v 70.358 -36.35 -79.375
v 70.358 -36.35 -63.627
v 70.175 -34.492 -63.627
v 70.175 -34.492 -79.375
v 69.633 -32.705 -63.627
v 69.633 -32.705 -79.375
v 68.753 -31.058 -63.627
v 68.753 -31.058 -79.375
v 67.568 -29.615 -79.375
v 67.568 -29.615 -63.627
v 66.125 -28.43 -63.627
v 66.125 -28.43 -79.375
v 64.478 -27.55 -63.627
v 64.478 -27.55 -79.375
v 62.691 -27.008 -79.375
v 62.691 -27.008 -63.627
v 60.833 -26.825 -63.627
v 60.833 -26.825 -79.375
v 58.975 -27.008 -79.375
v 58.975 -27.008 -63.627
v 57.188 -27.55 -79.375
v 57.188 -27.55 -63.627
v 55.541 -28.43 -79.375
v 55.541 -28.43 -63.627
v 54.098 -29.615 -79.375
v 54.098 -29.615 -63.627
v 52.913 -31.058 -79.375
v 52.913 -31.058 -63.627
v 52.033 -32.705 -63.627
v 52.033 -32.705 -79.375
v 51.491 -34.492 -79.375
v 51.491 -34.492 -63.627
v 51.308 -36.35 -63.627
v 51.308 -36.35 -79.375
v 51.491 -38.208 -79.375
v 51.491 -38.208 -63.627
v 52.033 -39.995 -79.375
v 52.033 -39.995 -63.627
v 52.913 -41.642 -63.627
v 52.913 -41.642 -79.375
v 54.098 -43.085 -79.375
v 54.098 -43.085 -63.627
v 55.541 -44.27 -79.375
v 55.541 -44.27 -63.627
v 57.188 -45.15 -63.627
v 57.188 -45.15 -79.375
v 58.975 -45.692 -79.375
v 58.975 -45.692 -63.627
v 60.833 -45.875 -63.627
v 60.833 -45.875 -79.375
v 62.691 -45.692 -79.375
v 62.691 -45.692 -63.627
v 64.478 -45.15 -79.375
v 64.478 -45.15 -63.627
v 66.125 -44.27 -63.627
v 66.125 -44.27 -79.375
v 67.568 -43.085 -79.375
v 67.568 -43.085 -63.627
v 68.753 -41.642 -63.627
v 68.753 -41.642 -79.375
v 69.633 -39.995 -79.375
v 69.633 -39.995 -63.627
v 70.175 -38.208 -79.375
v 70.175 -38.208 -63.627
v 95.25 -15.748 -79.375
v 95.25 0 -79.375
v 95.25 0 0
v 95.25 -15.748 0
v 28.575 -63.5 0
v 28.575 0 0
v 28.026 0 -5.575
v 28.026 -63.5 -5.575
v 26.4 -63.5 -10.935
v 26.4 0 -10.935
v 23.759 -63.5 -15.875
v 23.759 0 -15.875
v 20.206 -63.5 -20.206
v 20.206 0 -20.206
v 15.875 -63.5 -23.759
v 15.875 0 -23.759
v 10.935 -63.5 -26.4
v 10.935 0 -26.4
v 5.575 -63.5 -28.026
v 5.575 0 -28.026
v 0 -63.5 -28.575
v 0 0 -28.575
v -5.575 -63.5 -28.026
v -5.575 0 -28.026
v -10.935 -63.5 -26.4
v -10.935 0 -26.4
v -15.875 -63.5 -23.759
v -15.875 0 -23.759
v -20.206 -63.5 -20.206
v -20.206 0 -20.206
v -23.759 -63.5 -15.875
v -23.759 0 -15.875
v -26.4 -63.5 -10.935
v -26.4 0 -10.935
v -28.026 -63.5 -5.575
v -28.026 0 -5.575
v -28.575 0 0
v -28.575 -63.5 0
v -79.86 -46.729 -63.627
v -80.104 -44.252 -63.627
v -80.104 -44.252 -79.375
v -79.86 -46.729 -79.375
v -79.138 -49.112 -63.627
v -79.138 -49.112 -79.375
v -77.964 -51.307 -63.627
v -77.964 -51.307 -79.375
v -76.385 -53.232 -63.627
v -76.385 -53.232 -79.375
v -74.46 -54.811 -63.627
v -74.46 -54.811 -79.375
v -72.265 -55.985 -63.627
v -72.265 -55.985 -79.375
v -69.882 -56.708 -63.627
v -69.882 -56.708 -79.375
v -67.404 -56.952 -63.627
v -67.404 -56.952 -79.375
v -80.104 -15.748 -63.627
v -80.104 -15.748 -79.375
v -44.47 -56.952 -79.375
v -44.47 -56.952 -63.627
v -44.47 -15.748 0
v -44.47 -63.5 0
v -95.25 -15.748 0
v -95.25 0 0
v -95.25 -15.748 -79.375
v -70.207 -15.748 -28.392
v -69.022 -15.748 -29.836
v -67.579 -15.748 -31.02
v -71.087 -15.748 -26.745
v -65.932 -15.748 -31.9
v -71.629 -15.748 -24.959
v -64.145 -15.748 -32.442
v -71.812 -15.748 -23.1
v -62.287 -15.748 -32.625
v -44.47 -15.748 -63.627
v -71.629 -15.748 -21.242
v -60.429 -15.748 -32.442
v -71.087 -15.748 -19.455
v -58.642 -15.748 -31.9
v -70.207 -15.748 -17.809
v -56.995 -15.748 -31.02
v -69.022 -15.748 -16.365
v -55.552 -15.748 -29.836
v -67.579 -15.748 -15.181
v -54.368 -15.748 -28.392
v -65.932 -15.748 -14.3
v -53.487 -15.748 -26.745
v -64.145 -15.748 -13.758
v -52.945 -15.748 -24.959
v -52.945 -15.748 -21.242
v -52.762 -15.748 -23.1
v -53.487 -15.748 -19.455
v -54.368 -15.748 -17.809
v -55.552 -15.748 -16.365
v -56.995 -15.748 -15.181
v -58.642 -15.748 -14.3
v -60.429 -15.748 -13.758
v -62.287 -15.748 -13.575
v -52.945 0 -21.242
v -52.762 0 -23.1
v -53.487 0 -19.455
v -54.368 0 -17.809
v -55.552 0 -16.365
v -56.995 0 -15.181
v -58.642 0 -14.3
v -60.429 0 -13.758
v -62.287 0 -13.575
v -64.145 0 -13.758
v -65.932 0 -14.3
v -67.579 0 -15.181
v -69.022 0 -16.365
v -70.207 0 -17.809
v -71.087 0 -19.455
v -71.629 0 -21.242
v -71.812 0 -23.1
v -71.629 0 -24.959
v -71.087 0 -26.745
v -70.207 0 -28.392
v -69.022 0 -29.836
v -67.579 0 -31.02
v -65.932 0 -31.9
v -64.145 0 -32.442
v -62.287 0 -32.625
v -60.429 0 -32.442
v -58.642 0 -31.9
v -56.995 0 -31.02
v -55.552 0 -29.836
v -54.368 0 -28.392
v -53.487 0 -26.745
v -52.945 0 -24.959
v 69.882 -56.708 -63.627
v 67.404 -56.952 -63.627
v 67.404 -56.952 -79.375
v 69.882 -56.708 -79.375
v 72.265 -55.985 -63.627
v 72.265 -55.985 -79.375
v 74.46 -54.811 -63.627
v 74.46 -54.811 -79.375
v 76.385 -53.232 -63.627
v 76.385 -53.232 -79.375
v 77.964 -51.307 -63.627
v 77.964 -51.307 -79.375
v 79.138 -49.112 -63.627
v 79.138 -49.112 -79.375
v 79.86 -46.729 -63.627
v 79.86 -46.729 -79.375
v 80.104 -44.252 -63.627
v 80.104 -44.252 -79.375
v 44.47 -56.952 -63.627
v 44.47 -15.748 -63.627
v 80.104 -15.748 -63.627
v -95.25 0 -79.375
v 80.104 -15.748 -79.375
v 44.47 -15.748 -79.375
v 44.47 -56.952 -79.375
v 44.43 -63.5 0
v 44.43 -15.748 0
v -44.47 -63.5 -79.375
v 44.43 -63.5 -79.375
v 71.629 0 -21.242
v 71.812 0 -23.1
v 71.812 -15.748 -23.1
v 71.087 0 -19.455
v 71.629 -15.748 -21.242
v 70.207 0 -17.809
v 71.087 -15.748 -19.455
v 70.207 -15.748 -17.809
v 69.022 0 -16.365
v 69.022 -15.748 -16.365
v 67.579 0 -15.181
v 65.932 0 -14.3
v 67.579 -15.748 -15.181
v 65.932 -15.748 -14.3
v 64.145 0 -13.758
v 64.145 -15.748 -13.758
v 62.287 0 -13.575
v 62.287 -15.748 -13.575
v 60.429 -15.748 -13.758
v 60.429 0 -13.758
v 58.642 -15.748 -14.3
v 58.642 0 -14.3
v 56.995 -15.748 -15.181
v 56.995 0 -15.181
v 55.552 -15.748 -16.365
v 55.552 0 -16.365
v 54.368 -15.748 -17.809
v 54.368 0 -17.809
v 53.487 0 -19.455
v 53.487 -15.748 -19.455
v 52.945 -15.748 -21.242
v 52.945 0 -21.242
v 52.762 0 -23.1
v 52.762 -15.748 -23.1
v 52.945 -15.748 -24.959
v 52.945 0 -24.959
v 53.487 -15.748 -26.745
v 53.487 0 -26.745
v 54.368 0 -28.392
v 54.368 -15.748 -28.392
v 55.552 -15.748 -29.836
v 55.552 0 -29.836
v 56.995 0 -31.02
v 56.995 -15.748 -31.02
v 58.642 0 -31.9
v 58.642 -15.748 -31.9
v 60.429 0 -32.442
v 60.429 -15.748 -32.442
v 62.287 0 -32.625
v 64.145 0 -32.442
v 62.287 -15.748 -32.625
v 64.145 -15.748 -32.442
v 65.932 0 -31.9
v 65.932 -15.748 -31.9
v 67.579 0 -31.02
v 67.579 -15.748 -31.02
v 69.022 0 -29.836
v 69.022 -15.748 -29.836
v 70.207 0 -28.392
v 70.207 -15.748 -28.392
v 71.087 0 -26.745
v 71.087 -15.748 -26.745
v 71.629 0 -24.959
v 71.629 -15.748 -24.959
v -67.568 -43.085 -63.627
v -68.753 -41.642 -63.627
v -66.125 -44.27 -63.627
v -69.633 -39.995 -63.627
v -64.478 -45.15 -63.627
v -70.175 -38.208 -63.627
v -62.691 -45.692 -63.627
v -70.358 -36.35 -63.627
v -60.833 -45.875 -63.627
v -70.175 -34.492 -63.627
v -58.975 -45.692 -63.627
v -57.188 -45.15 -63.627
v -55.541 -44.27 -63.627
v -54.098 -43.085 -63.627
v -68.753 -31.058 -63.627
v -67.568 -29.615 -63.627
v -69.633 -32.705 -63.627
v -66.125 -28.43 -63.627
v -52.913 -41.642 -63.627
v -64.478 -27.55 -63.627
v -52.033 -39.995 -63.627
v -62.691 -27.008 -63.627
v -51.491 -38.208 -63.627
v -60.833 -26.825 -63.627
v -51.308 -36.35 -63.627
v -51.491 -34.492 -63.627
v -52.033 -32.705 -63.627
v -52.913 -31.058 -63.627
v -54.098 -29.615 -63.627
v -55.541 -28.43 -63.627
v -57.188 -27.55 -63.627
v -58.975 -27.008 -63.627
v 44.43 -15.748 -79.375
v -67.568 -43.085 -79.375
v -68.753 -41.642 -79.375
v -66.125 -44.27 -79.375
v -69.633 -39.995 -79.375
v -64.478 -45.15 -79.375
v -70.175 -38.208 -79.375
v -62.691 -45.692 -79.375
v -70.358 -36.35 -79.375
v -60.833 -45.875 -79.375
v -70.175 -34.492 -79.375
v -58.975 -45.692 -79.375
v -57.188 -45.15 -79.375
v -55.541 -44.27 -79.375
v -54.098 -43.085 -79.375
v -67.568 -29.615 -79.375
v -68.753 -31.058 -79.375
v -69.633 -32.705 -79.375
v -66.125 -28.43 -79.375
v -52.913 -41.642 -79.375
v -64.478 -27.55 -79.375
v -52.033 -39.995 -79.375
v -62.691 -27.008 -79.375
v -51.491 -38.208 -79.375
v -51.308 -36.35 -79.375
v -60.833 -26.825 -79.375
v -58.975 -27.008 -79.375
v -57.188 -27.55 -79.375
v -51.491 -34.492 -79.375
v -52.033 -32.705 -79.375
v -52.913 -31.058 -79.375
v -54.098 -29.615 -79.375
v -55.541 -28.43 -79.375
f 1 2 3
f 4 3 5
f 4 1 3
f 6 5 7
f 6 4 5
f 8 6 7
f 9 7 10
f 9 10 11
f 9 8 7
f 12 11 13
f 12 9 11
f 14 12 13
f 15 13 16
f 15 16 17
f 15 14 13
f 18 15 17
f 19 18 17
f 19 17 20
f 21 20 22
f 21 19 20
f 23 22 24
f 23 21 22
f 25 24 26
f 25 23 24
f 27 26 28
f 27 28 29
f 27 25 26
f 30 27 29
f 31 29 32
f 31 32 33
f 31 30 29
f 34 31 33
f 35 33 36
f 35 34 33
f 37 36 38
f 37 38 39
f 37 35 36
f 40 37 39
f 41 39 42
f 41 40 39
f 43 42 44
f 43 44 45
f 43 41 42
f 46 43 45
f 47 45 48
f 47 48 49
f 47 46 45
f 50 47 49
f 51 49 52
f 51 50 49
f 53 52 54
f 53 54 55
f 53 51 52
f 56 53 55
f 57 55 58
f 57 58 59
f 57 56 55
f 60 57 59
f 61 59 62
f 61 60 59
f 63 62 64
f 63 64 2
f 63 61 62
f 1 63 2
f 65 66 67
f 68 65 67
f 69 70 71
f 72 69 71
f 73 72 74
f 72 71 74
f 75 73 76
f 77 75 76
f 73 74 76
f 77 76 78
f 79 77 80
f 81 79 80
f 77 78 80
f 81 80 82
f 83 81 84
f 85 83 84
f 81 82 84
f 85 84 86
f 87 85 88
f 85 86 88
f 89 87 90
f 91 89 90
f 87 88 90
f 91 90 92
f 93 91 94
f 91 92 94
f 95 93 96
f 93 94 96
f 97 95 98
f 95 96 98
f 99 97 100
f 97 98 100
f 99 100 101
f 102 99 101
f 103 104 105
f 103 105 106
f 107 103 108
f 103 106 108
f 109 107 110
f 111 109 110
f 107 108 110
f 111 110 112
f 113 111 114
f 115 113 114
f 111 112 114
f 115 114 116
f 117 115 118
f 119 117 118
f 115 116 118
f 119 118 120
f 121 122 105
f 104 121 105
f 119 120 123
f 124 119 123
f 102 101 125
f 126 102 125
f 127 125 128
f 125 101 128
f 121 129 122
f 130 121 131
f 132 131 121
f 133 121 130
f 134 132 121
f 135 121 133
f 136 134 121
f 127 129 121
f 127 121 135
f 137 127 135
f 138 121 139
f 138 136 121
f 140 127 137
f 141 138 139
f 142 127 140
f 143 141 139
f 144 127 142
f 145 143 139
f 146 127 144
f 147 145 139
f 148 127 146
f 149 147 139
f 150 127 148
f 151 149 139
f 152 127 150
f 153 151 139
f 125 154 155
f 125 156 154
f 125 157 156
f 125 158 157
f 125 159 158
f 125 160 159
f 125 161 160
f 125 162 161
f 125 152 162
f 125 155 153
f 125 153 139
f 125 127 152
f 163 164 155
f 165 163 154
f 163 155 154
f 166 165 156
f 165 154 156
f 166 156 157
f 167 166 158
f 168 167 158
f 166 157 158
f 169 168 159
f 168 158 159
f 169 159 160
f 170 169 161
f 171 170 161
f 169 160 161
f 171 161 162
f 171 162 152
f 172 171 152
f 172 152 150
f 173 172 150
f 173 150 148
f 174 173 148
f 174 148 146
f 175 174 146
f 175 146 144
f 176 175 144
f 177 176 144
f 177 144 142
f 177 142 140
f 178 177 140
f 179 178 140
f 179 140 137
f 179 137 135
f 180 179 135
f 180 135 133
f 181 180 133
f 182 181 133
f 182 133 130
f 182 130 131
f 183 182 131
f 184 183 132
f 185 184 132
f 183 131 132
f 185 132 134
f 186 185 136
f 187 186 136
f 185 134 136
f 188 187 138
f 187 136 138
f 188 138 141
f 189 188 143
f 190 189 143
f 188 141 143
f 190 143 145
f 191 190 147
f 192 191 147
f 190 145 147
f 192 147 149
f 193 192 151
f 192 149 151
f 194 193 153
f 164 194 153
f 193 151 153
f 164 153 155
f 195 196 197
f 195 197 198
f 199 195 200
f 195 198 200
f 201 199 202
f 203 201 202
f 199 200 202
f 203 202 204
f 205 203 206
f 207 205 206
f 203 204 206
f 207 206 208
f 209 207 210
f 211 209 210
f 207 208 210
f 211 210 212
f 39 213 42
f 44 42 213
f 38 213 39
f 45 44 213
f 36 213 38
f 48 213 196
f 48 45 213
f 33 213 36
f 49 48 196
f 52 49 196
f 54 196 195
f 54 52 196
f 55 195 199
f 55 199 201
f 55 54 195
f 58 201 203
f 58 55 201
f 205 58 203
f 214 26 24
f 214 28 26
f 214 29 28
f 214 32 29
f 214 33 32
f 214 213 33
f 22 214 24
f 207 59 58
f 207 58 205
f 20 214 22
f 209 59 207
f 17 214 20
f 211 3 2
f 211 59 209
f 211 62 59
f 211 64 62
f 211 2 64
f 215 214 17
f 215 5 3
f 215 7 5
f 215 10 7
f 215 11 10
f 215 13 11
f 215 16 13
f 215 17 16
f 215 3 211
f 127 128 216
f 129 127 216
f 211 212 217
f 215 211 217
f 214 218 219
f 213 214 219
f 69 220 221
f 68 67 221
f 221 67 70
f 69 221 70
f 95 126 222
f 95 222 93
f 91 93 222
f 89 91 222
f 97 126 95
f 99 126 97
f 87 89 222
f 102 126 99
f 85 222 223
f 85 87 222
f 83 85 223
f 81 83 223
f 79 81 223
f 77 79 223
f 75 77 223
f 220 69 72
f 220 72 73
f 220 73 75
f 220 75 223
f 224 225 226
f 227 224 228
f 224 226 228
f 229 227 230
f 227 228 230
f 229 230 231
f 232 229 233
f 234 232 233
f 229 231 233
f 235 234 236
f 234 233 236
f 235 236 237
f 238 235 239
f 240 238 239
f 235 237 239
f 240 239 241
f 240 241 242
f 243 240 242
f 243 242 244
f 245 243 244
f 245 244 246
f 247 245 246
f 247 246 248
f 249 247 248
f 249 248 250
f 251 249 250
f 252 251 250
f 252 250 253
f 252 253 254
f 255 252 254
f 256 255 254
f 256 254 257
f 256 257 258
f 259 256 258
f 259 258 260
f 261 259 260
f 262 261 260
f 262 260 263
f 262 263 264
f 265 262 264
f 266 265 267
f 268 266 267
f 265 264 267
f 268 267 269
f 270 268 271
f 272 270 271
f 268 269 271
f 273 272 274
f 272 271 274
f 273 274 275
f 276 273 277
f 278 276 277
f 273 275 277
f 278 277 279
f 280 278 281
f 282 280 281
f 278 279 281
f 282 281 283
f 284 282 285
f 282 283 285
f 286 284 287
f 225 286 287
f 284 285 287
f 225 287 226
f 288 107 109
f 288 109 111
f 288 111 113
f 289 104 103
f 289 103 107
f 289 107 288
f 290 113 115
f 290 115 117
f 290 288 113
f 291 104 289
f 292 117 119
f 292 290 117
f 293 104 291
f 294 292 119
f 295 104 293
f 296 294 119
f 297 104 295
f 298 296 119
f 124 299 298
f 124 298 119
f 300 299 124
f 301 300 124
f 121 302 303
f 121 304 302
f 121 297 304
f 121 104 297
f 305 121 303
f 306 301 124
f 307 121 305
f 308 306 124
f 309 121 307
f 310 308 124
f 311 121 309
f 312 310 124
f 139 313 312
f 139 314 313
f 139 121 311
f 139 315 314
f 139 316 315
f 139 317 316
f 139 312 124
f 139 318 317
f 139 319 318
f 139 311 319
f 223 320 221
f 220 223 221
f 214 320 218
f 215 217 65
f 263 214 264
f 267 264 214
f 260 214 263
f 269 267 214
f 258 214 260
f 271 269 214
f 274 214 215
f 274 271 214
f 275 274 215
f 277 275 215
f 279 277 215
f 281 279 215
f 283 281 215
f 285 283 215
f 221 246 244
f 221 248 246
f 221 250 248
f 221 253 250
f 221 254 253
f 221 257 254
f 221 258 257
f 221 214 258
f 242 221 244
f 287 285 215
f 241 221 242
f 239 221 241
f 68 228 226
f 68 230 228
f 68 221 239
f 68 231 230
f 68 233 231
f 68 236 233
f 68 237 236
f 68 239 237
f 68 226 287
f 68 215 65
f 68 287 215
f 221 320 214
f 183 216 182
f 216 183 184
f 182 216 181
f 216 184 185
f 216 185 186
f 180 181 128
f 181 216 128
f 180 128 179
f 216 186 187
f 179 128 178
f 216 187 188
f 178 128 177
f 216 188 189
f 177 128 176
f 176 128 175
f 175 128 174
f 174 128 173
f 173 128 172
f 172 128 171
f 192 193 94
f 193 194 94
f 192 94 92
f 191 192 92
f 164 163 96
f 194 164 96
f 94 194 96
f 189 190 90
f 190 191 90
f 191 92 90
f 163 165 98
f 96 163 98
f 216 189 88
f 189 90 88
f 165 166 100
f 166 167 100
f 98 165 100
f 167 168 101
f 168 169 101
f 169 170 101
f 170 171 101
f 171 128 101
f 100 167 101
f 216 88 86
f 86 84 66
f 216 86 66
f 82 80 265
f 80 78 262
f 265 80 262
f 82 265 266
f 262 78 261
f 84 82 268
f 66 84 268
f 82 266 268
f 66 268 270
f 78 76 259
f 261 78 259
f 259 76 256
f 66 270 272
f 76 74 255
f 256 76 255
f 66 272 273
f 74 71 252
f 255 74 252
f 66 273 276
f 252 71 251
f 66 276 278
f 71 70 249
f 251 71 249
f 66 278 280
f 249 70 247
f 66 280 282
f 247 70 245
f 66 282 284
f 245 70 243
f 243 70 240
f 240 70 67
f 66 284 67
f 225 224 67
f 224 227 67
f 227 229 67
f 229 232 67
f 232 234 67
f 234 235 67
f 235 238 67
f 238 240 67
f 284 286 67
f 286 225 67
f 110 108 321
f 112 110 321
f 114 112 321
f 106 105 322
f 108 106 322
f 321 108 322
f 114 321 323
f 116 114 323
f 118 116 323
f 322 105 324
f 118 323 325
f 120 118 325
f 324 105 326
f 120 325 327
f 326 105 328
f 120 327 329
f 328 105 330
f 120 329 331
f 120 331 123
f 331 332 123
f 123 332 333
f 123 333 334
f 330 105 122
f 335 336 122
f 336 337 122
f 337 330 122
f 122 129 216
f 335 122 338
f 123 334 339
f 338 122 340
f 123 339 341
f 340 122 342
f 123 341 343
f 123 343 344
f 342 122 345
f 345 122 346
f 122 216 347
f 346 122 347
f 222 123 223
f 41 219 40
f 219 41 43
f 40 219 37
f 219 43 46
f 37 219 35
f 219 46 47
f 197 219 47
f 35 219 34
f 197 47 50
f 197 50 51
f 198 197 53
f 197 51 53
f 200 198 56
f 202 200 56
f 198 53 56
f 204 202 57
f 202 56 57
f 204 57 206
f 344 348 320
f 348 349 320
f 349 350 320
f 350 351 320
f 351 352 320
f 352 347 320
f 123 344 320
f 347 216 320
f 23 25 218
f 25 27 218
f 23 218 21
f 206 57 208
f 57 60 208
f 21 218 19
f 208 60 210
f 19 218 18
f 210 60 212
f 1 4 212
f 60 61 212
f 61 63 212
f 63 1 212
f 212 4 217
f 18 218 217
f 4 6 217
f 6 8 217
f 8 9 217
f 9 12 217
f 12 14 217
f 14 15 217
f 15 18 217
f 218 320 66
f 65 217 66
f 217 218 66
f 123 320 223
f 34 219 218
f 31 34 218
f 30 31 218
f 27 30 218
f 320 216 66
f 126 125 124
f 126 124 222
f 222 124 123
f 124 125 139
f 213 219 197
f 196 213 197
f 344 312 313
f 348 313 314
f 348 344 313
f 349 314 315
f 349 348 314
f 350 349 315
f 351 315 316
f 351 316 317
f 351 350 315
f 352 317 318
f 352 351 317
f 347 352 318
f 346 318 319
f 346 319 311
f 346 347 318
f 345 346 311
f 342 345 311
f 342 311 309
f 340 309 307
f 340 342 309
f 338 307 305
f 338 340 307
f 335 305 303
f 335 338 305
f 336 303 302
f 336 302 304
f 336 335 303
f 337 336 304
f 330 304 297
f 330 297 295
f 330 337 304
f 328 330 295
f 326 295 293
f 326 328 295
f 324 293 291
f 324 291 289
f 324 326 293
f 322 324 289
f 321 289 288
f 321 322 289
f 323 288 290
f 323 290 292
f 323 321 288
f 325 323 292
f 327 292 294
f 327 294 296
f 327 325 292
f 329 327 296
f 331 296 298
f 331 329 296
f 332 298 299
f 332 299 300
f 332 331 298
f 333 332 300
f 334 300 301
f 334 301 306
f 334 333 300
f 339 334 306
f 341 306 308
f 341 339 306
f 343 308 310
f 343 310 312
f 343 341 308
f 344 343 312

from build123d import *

# Parameters (mm, degrees)
F1_DEPTH = 15.748
F4_DEPTH = 47.752
F6_R     = 9.525
F7_DEPTH = 15.748
F8_R     = 9.525
F9_DEPTH = 25.4


with BuildPart() as f1:
    # F0 (on Front) → F1 (new body)
    with BuildSketch(Plane.XZ):
        with BuildLine():
            ThreePointArc((28.575, 0), (0, -28.575), (-28.575, 0))
            Line((-28.575, 0), (-95.25, 0))
            Line((-95.25, 0), (-95.25, -79.375))
            Line((-95.25, -79.375), (95.25, -79.375))
            Line((95.25, -79.375), (95.25, 0))
            Line((95.25, 0), (28.575, 0))
        make_face()
    extrude(amount=F1_DEPTH)

    # F2 (on face) → F4 (join)
    with BuildSketch(Plane.XZ.offset(15.748)):
        with BuildLine():
            Line((-28.575, 0), (-44.470076, 0))
            Line((-44.470076, 0), (-44.470076, -79.375))
            Line((-44.470076, -79.375), (44.429924, -79.375))
            Line((44.429924, -79.375), (44.429924, 0))
            Line((44.429924, 0), (28.575, 0))
            ThreePointArc((28.575, 0), (0, -28.575), (-28.575, 0))
        make_face()
    extrude(amount=F4_DEPTH)

    # F6 (on offset) → F7 (join)
    with BuildSketch(Plane.XY.offset(-79.375)):
        with BuildLine():
            Line((-44.470076, -15.748), (-80.10444, -15.748))
            Line((-80.10444, -15.748), (-80.10444, -44.251695))
            ThreePointArc((-80.10444, -44.251695), (-76.384697, -53.231951), (-67.40444, -56.951695))
            Line((-67.40444, -56.951695), (-44.470076, -56.951695))
            Line((-44.470076, -56.951695), (-44.470076, -15.748))
        make_face()
        with Locations((-60.833134, -36.349847)):
            Circle(F6_R, mode=Mode.SUBTRACT)
        with BuildLine():
            ThreePointArc((67.40444, -56.951695), (76.384697, -53.231951), (80.10444, -44.251695))
            Line((80.10444, -44.251695), (80.10444, -15.748))
            Line((80.10444, -15.748), (44.470076, -15.748))
            Line((44.470076, -15.748), (44.470076, -56.951695))
            Line((44.470076, -56.951695), (67.40444, -56.951695))
        make_face()
        with Locations((60.833134, -36.349847)):
            Circle(F6_R, mode=Mode.SUBTRACT)
    extrude(amount=F7_DEPTH)

    # F8 (on face) → F9 (cut)
    with BuildSketch(Plane.XZ.offset(15.748)):
        with Locations((62.287258, -23.100371)):
            Circle(F8_R)
        with Locations((-62.287258, -23.100371)):
            Circle(F8_R)
    extrude(amount=-F9_DEPTH, mode=Mode.SUBTRACT)


solid = f1.part
